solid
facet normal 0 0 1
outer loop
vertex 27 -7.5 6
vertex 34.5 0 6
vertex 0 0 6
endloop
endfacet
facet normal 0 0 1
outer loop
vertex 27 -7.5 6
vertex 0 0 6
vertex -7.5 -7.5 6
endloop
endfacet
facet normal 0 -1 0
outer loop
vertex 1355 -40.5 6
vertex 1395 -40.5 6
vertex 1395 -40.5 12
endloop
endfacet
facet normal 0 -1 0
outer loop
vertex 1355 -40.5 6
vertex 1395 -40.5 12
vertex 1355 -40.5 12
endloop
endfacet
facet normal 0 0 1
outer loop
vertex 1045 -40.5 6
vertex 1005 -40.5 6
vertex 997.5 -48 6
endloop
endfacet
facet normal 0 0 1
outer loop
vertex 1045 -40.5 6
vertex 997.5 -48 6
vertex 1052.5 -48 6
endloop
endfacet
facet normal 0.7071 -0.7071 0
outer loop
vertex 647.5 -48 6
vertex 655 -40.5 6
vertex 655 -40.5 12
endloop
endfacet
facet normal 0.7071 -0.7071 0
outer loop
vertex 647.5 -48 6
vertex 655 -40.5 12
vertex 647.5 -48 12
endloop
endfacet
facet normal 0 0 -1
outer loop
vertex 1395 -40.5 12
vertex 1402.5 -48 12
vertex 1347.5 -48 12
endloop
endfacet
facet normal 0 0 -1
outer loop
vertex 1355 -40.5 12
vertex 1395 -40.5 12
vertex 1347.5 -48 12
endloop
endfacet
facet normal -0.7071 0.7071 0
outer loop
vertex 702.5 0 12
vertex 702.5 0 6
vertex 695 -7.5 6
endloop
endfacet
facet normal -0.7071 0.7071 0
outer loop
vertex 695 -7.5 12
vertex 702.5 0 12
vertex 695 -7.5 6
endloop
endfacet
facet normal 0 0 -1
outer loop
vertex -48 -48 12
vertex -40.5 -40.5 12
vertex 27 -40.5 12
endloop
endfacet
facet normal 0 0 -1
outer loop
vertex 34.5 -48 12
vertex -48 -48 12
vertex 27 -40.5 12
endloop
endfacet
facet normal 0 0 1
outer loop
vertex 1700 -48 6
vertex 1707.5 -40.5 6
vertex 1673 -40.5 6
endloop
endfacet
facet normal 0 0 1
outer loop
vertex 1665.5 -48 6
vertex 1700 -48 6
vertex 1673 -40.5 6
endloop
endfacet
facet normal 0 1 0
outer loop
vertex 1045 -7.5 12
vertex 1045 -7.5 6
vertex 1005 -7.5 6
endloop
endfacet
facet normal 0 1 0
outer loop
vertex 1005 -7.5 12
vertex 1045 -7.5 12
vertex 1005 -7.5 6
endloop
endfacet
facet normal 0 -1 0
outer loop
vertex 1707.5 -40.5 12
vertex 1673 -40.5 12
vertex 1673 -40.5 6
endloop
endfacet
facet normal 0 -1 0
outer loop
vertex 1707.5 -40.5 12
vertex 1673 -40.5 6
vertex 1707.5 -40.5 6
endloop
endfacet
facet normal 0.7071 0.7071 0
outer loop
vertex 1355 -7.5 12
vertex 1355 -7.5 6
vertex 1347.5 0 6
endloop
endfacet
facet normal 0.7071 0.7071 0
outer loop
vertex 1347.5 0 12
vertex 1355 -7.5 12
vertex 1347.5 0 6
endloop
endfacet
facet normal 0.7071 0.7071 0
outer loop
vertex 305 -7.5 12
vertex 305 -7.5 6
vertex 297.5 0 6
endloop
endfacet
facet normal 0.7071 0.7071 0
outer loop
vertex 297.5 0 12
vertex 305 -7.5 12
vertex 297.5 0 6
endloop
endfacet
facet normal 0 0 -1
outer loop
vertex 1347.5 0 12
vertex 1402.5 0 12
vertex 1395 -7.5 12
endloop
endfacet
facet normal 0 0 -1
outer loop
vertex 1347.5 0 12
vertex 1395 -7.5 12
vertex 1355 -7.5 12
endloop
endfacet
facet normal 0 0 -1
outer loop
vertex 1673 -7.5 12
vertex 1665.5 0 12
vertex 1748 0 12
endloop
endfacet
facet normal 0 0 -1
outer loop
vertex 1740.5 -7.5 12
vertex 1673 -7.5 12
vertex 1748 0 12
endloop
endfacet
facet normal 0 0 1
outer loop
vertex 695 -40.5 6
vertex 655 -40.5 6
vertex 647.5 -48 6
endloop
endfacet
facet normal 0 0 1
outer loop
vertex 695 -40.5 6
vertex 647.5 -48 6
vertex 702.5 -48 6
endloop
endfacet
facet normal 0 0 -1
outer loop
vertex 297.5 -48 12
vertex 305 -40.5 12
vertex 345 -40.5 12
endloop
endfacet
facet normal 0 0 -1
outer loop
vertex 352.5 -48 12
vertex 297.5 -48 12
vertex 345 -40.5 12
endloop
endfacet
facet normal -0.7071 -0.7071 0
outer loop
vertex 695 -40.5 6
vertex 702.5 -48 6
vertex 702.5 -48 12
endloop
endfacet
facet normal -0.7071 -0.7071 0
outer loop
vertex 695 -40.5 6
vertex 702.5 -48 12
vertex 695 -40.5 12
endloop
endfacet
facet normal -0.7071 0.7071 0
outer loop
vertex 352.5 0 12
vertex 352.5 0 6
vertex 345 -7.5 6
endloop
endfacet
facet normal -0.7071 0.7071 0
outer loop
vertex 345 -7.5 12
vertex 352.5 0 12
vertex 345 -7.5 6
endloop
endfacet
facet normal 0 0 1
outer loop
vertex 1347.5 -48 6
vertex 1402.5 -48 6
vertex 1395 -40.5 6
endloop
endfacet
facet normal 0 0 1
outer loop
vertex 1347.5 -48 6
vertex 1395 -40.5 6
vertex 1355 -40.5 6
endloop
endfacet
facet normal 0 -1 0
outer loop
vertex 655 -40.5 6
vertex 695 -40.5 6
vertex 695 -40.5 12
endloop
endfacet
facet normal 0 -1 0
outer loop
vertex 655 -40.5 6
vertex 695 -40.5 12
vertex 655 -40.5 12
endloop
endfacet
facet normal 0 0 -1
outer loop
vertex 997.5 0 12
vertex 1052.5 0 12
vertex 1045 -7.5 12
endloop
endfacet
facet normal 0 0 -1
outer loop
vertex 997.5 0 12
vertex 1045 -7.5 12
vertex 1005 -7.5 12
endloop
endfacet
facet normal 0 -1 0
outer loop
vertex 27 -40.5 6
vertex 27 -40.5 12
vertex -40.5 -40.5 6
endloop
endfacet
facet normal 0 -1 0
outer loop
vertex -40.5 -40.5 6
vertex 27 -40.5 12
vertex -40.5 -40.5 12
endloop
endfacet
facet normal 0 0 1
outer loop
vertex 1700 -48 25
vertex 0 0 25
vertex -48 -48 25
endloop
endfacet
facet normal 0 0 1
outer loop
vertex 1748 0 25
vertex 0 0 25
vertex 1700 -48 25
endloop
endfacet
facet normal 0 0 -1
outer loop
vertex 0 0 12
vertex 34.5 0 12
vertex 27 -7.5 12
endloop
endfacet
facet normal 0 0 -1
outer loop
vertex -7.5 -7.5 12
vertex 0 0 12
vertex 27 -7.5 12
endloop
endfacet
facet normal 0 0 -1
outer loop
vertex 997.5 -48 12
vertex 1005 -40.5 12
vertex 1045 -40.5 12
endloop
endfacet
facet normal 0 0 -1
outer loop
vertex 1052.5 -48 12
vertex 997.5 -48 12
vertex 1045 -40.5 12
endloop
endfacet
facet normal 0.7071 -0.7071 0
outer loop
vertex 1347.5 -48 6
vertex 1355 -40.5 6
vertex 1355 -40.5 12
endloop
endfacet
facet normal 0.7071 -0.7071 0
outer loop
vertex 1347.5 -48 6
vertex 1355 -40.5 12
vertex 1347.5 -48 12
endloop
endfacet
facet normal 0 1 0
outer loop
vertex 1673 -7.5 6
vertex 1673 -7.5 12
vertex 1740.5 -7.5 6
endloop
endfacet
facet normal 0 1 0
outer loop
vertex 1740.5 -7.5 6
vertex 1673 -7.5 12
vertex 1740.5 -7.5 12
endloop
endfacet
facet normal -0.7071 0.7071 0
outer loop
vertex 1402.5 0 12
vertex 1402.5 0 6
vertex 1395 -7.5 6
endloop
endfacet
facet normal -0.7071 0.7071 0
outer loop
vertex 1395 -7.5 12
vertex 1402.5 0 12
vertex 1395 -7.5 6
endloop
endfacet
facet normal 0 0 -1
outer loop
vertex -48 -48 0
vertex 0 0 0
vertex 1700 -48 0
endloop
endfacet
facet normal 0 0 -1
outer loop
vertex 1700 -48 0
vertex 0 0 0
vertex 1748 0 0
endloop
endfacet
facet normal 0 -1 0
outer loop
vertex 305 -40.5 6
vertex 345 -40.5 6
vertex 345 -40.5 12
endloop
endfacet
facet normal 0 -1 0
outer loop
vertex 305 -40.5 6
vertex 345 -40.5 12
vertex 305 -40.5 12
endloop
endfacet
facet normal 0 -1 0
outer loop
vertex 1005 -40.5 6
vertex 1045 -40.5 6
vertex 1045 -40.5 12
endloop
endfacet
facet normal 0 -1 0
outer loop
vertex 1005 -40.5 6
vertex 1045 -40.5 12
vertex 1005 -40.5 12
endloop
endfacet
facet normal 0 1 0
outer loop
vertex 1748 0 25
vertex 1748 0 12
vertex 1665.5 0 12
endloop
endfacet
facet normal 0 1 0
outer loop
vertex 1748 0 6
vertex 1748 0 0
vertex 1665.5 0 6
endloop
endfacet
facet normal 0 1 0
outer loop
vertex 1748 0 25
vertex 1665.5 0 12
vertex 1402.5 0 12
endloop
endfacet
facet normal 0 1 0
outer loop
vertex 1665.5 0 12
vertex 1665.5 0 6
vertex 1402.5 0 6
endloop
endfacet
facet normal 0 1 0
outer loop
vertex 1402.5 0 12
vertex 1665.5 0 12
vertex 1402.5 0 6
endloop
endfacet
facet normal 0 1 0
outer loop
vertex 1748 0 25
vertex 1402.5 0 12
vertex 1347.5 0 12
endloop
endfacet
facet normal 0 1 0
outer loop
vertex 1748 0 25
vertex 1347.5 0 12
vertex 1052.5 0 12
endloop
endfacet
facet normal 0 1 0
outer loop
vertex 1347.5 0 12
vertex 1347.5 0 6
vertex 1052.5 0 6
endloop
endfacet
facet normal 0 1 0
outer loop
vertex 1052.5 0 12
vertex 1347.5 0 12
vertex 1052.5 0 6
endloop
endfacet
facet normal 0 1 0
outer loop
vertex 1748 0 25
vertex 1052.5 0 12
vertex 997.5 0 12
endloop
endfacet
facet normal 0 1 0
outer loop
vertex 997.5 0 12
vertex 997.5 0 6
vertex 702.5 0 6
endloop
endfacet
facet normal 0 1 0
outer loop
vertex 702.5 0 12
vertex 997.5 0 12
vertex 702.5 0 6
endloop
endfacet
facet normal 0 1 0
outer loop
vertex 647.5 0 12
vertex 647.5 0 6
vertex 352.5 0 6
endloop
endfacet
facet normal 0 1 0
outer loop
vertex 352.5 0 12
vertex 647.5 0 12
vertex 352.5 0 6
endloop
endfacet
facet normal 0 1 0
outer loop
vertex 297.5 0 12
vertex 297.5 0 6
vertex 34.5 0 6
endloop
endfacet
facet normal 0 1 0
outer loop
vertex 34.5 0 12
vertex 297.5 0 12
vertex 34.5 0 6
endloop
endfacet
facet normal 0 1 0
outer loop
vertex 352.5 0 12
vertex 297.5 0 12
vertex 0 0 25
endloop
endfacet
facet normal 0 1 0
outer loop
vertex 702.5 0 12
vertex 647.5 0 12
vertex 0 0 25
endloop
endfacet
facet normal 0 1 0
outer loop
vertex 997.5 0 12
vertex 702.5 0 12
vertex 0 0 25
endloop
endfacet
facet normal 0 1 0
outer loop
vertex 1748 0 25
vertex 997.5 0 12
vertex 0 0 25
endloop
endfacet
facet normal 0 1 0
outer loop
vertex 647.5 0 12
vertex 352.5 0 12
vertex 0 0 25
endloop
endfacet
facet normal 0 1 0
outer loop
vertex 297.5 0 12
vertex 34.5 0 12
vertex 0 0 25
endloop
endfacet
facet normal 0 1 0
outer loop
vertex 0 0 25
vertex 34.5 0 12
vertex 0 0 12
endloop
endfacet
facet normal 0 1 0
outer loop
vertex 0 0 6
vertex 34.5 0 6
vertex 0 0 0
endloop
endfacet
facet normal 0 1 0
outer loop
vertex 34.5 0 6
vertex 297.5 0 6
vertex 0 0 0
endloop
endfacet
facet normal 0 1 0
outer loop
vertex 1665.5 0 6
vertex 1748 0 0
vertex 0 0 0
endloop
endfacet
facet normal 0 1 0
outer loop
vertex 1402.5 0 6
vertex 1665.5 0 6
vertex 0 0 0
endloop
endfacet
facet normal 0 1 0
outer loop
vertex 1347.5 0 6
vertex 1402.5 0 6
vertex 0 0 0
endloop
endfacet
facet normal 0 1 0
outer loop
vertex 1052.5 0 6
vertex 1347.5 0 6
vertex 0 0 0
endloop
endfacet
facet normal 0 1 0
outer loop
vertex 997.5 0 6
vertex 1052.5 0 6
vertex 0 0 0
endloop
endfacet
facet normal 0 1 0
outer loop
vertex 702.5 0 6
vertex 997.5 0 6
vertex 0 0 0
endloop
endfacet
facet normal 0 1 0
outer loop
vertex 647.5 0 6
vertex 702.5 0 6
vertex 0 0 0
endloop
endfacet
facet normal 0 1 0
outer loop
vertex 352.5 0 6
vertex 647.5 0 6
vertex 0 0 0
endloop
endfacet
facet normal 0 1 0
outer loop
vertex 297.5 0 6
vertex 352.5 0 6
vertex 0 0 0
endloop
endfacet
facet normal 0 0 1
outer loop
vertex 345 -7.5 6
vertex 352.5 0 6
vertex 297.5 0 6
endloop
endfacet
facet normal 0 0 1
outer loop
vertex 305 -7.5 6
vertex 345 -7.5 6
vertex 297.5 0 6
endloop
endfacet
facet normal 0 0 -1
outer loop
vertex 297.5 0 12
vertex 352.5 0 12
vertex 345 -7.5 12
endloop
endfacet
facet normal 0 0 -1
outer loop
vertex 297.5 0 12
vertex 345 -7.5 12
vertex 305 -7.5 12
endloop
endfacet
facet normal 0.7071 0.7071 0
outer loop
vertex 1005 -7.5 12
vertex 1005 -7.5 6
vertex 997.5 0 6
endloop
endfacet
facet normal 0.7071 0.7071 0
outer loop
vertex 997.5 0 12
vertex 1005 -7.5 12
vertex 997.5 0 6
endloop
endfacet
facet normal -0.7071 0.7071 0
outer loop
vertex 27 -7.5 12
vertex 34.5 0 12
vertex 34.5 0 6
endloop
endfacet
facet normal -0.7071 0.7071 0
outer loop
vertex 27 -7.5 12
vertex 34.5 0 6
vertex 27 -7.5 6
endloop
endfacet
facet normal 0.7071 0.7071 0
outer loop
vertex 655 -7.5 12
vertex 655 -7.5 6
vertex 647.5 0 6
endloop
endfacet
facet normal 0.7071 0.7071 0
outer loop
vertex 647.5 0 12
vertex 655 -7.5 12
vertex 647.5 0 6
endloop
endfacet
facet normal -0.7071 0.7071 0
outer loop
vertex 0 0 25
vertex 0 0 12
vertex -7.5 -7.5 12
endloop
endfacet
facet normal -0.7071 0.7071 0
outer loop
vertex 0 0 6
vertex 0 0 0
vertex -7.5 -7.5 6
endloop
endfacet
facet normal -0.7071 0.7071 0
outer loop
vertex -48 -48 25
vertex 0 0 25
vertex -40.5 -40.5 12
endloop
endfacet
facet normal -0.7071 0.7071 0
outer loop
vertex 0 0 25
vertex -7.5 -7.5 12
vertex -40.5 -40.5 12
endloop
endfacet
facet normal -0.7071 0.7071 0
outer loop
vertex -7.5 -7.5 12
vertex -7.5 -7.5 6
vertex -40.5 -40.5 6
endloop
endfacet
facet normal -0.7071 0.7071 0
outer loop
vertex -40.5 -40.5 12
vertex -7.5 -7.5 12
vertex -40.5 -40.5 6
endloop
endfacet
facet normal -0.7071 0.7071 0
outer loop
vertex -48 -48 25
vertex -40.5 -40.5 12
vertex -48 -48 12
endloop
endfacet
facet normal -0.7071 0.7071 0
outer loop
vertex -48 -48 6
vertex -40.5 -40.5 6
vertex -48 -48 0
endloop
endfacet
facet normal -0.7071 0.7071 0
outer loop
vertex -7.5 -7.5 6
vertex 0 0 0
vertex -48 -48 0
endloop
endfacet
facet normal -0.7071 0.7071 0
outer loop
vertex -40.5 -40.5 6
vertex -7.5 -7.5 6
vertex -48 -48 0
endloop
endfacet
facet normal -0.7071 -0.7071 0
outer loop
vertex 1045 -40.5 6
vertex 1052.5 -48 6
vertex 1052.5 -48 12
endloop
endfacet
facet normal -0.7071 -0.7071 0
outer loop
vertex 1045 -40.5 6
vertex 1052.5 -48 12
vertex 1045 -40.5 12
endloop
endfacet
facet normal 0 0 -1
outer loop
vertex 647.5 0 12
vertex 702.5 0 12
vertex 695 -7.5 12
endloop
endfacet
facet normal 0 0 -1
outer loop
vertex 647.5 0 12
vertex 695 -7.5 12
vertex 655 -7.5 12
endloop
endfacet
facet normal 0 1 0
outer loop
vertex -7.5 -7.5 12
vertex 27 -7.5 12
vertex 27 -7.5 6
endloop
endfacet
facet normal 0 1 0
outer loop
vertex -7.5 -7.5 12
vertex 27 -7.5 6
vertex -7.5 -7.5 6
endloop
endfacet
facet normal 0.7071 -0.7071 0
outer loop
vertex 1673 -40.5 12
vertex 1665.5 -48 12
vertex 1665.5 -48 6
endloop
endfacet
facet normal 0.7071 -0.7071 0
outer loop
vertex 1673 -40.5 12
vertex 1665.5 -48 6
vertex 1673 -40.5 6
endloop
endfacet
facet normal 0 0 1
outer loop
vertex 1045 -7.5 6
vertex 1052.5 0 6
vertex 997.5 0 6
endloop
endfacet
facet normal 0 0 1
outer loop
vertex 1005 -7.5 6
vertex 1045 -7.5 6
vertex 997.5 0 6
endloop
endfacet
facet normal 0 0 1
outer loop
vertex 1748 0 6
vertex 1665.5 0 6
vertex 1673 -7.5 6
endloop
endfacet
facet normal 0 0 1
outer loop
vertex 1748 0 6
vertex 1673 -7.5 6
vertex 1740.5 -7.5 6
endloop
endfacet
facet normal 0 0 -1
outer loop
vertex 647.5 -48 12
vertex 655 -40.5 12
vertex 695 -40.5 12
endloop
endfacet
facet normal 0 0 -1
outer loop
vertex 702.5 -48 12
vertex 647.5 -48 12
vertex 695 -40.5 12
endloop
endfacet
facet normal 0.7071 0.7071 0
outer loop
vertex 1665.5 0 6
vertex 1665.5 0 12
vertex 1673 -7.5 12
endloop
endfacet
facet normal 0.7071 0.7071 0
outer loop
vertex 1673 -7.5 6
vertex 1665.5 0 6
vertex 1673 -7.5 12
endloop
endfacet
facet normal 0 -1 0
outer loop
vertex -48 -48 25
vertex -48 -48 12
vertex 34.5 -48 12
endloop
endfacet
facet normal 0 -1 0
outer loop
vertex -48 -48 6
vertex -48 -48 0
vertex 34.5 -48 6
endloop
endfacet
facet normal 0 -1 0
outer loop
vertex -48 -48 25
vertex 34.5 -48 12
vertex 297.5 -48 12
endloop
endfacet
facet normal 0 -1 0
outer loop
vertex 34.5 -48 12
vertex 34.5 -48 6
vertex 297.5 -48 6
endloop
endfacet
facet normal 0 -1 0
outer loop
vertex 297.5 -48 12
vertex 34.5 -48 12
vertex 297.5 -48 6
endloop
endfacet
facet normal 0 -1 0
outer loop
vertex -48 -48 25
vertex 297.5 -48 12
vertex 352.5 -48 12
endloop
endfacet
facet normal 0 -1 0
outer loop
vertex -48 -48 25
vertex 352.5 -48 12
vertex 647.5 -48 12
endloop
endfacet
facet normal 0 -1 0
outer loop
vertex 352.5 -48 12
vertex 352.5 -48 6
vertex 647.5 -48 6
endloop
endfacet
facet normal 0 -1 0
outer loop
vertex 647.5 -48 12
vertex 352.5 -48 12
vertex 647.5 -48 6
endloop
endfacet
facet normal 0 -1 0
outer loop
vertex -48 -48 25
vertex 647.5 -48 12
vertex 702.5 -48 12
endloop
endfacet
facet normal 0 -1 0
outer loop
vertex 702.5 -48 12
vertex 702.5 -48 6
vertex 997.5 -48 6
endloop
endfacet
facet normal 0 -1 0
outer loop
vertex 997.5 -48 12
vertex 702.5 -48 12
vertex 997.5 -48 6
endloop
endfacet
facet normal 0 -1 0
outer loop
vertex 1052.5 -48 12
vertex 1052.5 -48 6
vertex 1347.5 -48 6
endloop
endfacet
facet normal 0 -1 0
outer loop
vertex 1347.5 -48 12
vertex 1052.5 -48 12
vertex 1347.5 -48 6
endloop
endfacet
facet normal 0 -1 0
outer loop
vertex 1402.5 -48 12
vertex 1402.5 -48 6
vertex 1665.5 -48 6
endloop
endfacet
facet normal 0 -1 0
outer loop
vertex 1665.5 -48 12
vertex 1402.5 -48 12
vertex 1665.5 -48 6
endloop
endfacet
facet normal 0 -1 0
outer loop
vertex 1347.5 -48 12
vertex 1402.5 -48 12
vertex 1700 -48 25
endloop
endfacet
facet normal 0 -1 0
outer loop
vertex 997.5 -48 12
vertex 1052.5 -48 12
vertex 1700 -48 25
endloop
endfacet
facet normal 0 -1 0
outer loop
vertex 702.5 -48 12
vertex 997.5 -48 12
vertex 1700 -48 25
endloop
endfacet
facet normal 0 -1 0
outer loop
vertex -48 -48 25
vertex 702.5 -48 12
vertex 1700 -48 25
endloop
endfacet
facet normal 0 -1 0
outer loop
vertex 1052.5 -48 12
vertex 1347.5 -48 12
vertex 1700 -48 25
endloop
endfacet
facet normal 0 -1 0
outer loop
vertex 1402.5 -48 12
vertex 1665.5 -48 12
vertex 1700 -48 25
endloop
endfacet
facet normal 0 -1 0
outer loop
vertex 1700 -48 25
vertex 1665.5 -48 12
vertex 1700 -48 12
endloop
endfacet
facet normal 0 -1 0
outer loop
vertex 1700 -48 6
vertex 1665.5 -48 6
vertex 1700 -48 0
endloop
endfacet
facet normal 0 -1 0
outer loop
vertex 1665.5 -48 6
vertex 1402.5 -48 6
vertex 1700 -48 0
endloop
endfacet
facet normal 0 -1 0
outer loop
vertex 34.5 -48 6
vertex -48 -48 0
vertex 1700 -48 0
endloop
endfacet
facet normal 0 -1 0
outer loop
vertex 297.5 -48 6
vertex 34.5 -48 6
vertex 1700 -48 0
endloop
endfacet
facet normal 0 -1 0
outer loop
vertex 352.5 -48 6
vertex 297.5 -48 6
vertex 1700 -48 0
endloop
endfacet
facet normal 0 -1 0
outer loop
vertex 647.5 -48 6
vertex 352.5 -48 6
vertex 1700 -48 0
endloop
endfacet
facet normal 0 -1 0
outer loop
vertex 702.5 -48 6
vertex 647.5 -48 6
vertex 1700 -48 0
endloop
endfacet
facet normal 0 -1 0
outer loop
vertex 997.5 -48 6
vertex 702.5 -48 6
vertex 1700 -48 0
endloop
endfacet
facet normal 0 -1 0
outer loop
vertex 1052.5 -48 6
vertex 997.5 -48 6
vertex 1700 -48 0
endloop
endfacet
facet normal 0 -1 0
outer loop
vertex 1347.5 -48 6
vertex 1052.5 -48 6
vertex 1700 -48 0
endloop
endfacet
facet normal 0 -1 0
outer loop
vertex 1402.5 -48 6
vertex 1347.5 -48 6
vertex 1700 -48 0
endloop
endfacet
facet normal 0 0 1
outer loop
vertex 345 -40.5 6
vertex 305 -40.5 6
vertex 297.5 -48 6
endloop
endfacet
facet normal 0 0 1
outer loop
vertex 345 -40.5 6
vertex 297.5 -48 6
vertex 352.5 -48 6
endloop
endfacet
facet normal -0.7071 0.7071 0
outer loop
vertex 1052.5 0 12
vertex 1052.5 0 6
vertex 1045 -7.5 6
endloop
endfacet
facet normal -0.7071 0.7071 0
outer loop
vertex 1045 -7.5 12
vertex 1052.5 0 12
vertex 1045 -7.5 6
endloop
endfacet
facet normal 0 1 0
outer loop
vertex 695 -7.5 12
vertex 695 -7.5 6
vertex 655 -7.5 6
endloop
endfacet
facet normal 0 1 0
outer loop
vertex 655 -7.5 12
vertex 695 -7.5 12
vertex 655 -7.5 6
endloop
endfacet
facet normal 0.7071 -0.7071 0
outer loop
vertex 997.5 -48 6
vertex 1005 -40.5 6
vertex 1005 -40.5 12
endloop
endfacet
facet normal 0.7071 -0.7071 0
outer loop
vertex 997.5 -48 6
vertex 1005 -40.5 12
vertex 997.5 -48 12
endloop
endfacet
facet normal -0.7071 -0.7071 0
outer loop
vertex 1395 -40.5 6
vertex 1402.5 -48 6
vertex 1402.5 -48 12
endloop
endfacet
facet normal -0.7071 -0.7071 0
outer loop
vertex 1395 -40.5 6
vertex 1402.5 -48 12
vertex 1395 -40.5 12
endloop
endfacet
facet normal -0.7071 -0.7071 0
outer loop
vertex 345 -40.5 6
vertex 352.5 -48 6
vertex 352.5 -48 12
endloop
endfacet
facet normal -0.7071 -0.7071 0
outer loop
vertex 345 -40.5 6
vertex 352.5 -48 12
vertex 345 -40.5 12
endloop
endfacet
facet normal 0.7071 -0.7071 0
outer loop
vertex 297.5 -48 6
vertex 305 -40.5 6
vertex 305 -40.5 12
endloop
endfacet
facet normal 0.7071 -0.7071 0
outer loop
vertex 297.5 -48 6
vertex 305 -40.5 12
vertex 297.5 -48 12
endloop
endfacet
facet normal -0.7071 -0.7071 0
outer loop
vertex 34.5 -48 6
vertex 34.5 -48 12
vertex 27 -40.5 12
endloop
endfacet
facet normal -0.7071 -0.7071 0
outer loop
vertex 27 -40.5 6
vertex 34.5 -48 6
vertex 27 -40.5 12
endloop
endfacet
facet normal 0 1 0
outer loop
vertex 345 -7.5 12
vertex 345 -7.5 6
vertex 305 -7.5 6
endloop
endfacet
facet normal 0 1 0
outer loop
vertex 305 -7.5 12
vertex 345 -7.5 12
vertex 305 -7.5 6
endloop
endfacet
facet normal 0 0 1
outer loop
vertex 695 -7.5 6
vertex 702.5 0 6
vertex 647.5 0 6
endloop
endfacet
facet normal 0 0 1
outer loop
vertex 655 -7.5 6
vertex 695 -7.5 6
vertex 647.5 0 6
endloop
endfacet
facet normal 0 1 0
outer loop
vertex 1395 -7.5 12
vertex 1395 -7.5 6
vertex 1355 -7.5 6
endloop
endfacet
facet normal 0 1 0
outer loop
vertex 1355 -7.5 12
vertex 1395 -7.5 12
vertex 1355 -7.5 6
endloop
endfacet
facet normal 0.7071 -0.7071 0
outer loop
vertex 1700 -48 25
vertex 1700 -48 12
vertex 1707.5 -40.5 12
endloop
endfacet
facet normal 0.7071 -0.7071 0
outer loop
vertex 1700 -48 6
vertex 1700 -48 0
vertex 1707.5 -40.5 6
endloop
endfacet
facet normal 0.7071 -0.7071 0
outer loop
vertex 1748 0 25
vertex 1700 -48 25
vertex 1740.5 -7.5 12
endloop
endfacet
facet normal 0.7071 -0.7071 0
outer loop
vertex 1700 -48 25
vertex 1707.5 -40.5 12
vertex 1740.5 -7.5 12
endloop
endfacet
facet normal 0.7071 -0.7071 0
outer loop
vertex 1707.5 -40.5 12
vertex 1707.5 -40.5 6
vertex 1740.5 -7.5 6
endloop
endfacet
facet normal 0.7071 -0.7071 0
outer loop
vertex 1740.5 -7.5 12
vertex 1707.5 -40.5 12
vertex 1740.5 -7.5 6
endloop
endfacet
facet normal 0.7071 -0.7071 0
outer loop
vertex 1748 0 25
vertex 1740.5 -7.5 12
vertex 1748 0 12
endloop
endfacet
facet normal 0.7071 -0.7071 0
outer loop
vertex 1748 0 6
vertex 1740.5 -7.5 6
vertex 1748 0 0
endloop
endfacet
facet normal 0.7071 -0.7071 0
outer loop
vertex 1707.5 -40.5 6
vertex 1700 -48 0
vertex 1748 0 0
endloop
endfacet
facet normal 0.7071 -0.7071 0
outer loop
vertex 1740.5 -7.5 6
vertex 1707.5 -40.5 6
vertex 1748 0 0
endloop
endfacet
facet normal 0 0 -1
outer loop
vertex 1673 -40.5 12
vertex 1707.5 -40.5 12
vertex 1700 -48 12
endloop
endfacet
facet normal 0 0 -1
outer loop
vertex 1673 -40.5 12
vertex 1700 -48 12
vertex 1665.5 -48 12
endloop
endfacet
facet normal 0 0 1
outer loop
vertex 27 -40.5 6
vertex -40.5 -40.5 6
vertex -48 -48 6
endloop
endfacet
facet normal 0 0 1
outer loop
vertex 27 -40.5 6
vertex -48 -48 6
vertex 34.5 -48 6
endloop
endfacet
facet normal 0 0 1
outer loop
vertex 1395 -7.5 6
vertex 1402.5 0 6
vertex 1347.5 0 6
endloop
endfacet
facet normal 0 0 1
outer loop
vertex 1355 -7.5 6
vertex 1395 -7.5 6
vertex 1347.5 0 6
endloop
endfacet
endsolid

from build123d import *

# Parameters (mm, degrees)
EXTRUDE_1_DEPTH        = 25
CUT_EXTRUDE_START      = -6
CUT_EXTRUDE_1_DEPTH    = 6
PATTERN_LINEAR_1_COUNT = 4
PATTERN_LINEAR_1_PITCH = 350
MIRROR_START           = -6
MIRROR_1_COPY_1_DEPTH  = 6
MIRROR_1_COPY_2_DEPTH  = 6
MIRROR_1_COPY_3_DEPTH  = 6
CUT_EXTRUDE_START_2    = -13
CUT_EXTRUDE_2_DEPTH    = 6


with BuildPart() as part:
    # 草图2 → 凸台-拉伸1 (new body)
    with BuildSketch(Plane.XY):
        Polygon((0, 0), (-48, -48), (1700, -48), (1748, 0), align=None)
    extrude(amount=EXTRUDE_1_DEPTH)

    # 草图3 → 切除-拉伸1 (cut)
    with BuildSketch(Plane(origin=(0, 0, 0), x_dir=(-1, 0, 0), z_dir=(0, 0, -1)).offset(CUT_EXTRUDE_START)):
        Polygon((-1402.5, 0), (-1395, -7.5), (-1355, -7.5), (-1347.5, 0), align=None)
    cut_extrude_1 = extrude(amount=-CUT_EXTRUDE_1_DEPTH, mode=Mode.SUBTRACT)

    # 阵列(线性)1: 切除-拉伸1 ×4
    with Locations(*[(-i * PATTERN_LINEAR_1_PITCH, 0, 0) for i in range(1, PATTERN_LINEAR_1_COUNT)]):
        add(cut_extrude_1, mode=Mode.SUBTRACT)

    # 镜向1: 切除-拉伸1 across plane
    add(cut_extrude_1.mirror(Plane.ZX.offset(-24)), mode=Mode.SUBTRACT)

    # 镜向1 copy 1 sketch → 镜向1 copy 1 (cut)
    with BuildSketch(Plane(origin=(-350, -48, 0), x_dir=(-1, 0, 0), z_dir=(0, 0, -1)).offset(MIRROR_START)):
        Polygon((-1402.5, 0), (-1395, 7.5), (-1355, 7.5), (-1347.5, 0), align=None)
    extrude(amount=-MIRROR_1_COPY_1_DEPTH, mode=Mode.SUBTRACT)

    # 镜向1 copy 2 sketch → 镜向1 copy 2 (cut)
    with BuildSketch(Plane(origin=(-700, -48, 0), x_dir=(-1, 0, 0), z_dir=(0, 0, -1)).offset(MIRROR_START)):
        Polygon((-1402.5, 0), (-1395, 7.5), (-1355, 7.5), (-1347.5, 0), align=None)
    extrude(amount=-MIRROR_1_COPY_2_DEPTH, mode=Mode.SUBTRACT)

    # 镜向1 copy 3 sketch → 镜向1 copy 3 (cut)
    with BuildSketch(Plane(origin=(-1050, -48, 0), x_dir=(-1, 0, 0), z_dir=(0, 0, -1)).offset(MIRROR_START)):
        Polygon((-1402.5, 0), (-1395, 7.5), (-1355, 7.5), (-1347.5, 0), align=None)
    extrude(amount=-MIRROR_1_COPY_3_DEPTH, mode=Mode.SUBTRACT)

    # 草图4 → 切除-拉伸2 (cut)
    with BuildSketch(Plane.XY.offset(25).offset(CUT_EXTRUDE_START_2)):
        Polygon((1665.5, 0), (1673, -7.5), (1740.5, -7.5), (1748, 0), align=None)
        Polygon((1665.5, -48), (1673, -40.5), (1707.5, -40.5), (1700, -48), align=None)
        Polygon((34.5, -48), (27, -40.5), (-40.5, -40.5), (-48, -48), align=None)
        Polygon((34.5, 0), (27, -7.5), (-7.5, -7.5), (0, 0), align=None)
    extrude(amount=-CUT_EXTRUDE_2_DEPTH, mode=Mode.SUBTRACT)


solid = part.part
